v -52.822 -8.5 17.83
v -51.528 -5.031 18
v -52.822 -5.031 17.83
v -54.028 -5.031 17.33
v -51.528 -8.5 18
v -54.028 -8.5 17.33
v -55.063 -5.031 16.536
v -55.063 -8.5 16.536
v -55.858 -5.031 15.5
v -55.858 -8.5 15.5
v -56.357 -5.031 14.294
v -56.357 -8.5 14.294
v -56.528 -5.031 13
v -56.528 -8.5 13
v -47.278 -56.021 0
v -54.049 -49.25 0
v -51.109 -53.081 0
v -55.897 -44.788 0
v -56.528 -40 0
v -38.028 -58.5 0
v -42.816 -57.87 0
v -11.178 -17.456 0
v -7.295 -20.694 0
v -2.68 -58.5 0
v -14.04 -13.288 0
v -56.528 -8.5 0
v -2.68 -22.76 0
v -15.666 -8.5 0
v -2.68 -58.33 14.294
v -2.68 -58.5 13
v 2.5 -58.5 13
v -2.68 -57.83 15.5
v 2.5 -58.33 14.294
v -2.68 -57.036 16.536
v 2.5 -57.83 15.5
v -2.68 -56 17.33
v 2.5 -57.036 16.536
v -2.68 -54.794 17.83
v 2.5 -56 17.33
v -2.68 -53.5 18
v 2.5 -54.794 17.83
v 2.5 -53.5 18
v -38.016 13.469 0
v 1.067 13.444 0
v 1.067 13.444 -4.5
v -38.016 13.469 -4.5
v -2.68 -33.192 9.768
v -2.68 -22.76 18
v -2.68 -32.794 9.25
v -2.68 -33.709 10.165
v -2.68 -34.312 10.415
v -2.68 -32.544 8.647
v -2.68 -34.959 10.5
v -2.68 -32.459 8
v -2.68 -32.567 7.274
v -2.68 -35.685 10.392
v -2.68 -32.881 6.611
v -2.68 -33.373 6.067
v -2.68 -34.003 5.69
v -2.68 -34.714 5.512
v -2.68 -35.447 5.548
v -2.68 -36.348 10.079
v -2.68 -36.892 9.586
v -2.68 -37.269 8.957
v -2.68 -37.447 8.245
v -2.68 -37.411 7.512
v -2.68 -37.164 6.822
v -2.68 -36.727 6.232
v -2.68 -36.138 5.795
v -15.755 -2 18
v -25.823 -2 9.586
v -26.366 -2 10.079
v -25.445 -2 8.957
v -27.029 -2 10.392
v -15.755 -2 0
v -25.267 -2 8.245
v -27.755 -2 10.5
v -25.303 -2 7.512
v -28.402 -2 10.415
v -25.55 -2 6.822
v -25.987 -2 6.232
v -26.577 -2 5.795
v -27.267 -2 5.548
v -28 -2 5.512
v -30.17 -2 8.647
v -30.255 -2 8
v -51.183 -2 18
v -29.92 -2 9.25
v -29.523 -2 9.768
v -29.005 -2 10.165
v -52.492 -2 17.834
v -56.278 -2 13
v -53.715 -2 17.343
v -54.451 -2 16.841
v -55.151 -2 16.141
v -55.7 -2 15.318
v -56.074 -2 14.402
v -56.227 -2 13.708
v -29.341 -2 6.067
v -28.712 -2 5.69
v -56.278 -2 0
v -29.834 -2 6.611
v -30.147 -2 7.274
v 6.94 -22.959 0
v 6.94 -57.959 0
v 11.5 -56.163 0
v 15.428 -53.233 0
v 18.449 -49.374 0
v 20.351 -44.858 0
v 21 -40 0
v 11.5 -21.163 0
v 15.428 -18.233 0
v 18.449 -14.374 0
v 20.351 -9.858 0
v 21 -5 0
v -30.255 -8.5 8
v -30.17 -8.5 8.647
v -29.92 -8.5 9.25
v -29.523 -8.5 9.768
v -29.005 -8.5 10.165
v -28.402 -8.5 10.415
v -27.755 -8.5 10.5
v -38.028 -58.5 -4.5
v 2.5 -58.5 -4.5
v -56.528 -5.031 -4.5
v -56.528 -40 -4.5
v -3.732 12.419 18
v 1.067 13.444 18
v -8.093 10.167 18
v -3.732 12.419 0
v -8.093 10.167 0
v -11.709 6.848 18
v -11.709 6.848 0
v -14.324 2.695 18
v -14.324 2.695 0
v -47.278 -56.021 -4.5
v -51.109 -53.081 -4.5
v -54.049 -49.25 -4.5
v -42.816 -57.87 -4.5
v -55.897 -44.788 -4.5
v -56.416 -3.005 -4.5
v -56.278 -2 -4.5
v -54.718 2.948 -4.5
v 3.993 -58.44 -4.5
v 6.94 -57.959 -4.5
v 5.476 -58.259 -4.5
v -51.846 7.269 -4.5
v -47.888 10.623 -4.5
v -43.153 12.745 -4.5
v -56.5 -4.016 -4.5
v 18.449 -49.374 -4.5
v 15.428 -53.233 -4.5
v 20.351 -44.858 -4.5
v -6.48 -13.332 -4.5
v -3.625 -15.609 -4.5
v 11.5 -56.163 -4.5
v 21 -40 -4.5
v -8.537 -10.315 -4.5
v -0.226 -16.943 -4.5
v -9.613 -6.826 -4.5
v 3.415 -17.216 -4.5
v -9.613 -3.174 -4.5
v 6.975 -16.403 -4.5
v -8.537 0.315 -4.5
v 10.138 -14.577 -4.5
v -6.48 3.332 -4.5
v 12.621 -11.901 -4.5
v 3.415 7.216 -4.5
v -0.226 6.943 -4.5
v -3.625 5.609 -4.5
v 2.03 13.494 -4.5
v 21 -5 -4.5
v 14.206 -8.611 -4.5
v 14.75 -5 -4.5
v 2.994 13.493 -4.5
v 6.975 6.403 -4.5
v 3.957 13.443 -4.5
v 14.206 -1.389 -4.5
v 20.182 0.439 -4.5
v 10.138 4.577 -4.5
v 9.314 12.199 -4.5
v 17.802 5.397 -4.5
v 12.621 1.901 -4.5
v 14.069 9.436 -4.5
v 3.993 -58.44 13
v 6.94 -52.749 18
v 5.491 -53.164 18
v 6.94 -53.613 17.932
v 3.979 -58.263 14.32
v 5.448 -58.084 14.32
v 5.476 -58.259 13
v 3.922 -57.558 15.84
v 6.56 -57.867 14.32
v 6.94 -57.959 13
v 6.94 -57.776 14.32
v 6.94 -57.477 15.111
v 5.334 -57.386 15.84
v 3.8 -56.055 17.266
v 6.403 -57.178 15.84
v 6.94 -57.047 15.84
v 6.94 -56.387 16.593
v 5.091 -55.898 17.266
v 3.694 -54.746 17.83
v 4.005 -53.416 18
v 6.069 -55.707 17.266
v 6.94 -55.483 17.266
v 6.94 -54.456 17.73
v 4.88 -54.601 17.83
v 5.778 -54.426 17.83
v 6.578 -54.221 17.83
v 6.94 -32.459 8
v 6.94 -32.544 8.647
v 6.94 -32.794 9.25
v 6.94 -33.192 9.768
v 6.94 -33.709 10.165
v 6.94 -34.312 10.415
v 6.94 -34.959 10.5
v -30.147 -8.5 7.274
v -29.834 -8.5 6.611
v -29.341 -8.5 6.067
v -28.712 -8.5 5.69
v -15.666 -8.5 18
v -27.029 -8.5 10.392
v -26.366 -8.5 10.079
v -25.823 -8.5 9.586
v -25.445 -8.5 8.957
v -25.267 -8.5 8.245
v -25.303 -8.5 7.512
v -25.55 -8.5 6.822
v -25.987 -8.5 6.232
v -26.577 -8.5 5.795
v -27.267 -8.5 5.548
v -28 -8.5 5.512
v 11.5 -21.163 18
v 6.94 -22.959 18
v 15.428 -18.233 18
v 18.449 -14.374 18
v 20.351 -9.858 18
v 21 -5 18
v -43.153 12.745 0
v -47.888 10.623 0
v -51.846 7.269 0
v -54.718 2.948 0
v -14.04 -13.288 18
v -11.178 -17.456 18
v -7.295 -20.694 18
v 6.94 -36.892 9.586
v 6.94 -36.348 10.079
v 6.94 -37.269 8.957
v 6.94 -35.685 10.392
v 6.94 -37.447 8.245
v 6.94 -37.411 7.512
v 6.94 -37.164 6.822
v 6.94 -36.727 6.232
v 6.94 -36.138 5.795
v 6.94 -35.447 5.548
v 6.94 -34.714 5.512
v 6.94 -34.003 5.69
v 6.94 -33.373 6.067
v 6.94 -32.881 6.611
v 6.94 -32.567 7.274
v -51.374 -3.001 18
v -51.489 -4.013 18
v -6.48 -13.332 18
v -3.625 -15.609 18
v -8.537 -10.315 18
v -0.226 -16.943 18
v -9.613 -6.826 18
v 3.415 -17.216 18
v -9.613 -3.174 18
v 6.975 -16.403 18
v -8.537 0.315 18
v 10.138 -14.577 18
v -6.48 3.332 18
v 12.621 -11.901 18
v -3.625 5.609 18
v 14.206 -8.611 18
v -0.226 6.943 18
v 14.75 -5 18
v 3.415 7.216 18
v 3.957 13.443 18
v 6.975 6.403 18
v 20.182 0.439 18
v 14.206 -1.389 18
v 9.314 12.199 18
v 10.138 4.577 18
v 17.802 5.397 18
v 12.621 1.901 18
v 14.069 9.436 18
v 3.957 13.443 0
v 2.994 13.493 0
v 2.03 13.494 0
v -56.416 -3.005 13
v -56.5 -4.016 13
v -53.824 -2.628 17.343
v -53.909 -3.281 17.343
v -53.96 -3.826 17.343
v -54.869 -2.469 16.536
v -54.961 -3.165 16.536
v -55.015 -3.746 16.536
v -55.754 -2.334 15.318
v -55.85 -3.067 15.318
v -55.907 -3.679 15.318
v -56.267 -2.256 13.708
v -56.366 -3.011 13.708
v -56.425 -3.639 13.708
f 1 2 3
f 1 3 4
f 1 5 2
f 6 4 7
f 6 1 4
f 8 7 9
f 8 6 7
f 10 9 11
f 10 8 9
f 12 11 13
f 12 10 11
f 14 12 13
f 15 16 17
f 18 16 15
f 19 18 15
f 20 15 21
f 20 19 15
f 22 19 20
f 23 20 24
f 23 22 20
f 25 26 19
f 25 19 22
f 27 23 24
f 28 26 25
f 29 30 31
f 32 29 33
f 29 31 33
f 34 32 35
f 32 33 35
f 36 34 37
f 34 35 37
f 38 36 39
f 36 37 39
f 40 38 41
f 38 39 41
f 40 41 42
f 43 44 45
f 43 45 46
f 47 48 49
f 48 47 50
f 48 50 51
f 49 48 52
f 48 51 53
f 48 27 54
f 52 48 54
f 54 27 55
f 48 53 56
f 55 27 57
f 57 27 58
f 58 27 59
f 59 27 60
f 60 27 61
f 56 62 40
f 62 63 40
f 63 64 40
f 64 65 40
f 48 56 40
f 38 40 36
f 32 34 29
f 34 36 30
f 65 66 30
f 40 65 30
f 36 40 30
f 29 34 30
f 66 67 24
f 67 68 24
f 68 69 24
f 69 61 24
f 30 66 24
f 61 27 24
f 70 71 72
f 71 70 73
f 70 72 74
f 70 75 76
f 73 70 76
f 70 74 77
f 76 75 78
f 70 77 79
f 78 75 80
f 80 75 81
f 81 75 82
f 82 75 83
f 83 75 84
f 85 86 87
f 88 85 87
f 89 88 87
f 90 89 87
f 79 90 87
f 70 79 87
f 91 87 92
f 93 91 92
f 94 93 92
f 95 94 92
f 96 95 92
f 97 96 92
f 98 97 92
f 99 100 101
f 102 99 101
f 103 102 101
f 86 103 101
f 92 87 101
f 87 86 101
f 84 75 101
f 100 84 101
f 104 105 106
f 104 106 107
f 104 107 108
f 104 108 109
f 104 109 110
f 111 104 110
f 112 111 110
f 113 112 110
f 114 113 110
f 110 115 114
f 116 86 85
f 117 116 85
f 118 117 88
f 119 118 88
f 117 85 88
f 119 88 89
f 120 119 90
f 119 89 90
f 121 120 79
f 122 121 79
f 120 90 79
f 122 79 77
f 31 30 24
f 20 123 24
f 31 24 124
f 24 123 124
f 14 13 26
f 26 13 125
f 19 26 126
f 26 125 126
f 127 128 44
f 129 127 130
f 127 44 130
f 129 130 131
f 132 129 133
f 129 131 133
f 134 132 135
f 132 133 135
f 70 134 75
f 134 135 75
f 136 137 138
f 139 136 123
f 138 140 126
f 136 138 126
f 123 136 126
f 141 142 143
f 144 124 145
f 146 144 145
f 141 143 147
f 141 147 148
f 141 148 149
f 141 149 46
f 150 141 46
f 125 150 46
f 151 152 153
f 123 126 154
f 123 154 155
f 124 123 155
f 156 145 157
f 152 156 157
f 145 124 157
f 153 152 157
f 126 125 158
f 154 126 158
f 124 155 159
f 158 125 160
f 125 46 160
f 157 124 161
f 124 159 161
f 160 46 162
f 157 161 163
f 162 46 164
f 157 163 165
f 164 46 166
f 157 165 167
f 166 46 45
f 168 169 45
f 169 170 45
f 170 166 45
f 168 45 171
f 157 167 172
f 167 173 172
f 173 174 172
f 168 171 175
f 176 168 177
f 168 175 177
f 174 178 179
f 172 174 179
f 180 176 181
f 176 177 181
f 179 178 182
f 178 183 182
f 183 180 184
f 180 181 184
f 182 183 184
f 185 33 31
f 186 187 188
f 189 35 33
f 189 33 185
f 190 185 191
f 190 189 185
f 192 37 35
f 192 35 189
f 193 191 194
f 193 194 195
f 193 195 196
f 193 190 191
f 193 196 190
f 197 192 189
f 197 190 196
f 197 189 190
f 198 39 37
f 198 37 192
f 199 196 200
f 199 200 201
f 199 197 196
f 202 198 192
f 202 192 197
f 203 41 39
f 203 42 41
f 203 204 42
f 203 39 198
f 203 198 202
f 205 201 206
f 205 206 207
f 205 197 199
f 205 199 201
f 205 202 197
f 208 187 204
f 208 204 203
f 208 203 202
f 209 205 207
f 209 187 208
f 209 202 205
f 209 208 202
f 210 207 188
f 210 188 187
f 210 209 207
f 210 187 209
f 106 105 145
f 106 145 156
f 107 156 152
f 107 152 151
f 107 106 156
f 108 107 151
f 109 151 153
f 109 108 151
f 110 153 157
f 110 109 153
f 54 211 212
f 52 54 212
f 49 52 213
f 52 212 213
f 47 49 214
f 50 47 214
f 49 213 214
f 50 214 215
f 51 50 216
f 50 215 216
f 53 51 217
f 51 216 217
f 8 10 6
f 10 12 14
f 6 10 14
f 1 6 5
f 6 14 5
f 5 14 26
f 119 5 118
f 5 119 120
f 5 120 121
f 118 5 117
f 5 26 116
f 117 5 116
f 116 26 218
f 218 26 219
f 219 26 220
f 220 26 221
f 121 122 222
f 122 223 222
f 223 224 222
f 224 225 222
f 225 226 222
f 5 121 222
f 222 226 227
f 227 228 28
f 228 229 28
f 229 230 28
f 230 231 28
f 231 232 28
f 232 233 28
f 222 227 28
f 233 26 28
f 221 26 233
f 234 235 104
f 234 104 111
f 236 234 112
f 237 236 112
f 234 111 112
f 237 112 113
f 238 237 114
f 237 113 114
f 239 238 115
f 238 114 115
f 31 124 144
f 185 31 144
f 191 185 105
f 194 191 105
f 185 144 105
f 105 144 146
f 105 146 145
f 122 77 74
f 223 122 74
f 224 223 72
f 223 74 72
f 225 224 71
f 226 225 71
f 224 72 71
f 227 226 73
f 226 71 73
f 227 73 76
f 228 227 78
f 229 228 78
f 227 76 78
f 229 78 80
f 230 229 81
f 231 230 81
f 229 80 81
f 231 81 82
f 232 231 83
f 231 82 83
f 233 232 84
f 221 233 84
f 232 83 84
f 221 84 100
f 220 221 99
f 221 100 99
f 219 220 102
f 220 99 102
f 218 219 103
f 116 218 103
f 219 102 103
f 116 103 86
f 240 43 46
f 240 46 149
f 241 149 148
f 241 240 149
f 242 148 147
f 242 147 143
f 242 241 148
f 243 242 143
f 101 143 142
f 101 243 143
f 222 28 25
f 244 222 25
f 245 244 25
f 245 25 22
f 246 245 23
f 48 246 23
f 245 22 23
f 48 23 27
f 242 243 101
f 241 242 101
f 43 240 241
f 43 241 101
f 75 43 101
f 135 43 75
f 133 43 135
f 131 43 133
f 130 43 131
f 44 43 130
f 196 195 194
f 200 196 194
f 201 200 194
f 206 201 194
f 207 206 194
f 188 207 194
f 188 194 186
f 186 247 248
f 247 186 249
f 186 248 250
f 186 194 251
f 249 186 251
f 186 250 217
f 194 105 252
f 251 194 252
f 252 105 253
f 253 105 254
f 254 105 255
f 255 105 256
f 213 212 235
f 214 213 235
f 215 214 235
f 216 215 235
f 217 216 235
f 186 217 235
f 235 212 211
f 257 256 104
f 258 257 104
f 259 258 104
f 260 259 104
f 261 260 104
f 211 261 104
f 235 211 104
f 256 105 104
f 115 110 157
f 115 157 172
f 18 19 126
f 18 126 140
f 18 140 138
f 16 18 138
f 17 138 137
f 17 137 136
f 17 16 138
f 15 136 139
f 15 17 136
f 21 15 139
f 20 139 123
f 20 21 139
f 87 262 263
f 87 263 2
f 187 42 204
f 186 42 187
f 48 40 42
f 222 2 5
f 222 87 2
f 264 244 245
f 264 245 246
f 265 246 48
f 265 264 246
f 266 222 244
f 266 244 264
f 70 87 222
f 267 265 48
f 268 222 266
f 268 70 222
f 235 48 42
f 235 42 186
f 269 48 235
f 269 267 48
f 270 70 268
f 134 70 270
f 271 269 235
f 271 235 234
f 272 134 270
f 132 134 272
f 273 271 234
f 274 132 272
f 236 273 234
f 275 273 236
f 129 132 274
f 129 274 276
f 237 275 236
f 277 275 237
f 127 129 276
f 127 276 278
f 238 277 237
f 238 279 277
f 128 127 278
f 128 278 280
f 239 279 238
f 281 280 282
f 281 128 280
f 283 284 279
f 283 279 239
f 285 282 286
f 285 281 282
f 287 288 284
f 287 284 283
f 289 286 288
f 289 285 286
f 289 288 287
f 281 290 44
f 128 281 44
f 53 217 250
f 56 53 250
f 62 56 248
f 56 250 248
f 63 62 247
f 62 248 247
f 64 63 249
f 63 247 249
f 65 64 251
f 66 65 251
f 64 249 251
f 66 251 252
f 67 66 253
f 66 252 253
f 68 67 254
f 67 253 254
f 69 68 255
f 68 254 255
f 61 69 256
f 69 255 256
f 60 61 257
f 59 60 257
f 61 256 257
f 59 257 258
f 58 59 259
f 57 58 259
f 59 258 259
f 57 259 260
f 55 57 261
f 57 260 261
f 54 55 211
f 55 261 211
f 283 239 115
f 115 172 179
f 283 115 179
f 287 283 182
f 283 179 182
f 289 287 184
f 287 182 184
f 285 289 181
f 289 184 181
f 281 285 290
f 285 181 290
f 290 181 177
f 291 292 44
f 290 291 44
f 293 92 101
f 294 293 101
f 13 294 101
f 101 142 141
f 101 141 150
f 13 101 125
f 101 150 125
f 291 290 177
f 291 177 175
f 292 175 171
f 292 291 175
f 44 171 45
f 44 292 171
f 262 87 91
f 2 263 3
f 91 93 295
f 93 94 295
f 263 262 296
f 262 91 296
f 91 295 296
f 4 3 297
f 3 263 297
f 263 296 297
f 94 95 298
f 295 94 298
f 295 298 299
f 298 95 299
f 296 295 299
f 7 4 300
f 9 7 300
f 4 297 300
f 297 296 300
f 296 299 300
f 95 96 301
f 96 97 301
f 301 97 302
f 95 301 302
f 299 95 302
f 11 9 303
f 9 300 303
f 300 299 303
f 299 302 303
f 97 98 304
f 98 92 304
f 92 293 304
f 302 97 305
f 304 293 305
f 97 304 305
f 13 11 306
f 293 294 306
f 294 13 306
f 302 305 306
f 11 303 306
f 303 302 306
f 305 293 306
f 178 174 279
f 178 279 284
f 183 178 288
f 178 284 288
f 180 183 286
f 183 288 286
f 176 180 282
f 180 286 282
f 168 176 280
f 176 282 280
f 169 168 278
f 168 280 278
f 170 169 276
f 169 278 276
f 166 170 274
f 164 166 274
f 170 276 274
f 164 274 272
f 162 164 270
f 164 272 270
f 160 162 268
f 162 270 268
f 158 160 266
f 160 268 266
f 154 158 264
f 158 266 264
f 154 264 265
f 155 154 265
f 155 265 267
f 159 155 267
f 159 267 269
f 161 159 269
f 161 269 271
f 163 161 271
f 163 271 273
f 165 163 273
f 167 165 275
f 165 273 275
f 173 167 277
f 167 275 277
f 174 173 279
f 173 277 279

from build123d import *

# Parameters (mm, degrees)
F0_R     = 13.35
F1_DEPTH = 4.5
F2_DEPTH = 18
F5_DEPTH = 63.468562
F6_DEPTH = 56.501
F7_R     = 5
F8_R     = 13.35
F8_R_2   = 12.25
F9_DEPTH = 22.5


with BuildPart() as f1:
    # F0 (on Top) → F1 (new body)
    with BuildSketch(Plane.XY):
        with BuildLine():
            ThreePointArc((6.94, -57.959298), (17.066915, -51.404166), (21, -40))
            Line((21, -40), (21, -5))
            ThreePointArc((21, -5), (17.066915, -16.404166), (6.94, -22.959298))
            Line((6.94, -22.959298), (6.94, -57.959298))
        make_face()
        with Locations((2.5, -5)):
            Circle(F0_R)
        with BuildLine():
            ThreePointArc((6.94, -22.959298), (17.066915, -16.404166), (21, -5))
            ThreePointArc((21, -5), (16.086734, 7.555902), (3.956684, 13.442561))
            Line((3.956684, 13.442561), (1.066985, 13.444416))
            ThreePointArc((1.066985, 13.444416), (-10.011528, 8.627607), (-15.755136, -2))
            ThreePointArc((-15.755136, -2), (-15.998257, -5.25395), (-15.665902, -8.5))
            ThreePointArc((-15.665902, -8.5), (-11.178256, -17.456136), (-2.68, -22.76))
            ThreePointArc((-2.68, -22.76), (2.116816, -23.496031), (6.94, -22.959298))
        make_face()
        with Locations((2.5, -5)):
            Circle(F0_R, mode=Mode.SUBTRACT)
        with BuildLine():
            ThreePointArc((2.5, -58.5), (4.736401, -58.364327), (6.94, -57.959298))
            Line((6.94, -57.959298), (6.94, -22.959298))
            ThreePointArc((6.94, -22.959298), (2.116816, -23.496031), (-2.68, -22.76))
            Line((-2.68, -22.76), (-2.68, -58.5))
            Line((-2.68, -58.5), (2.5, -58.5))
        make_face()
        with BuildLine():
            Line((1.066985, 13.444416), (3.956684, 13.442561))
            ThreePointArc((3.956684, 13.442561), (2.511871, 13.499996), (1.066985, 13.444416))
        make_face()
        with BuildLine():
            ThreePointArc((-15.755136, -2), (-10.011528, 8.627607), (1.066985, 13.444416))
            Line((1.066985, 13.444416), (-38.015691, 13.469493))
            ThreePointArc((-38.015691, 13.469493), (-49.985176, 9.085639), (-56.277659, -2))
            Line((-56.277659, -2), (-15.755136, -2))
        make_face()
        with BuildLine():
            Line((-2.68, -58.5), (-2.68, -22.76))
            ThreePointArc((-2.68, -22.76), (-11.178256, -17.456136), (-15.665902, -8.5))
            Line((-15.665902, -8.5), (-56.527562, -8.5))
            Line((-56.527562, -8.5), (-56.527562, -40))
            ThreePointArc((-56.527562, -40), (-51.109037, -53.081475), (-38.027562, -58.5))
            Line((-38.027562, -58.5), (-2.68, -58.5))
        make_face()
        with BuildLine():
            ThreePointArc((-15.665902, -8.5), (-15.998257, -5.25395), (-15.755136, -2))
            Line((-15.755136, -2), (-56.277659, -2))
            ThreePointArc((-56.277659, -2), (-56.46498, -3.510108), (-56.527562, -5.030503))
            Line((-56.527562, -5.030503), (-56.527562, -8.5))
            Line((-56.527562, -8.5), (-15.665902, -8.5))
        make_face()
    extrude(amount=-F1_DEPTH)

    # F0 (on Top) → F2 (join)
    with BuildSketch(Plane.XY):
        with BuildLine():
            ThreePointArc((2.5, -58.5), (4.736401, -58.364327), (6.94, -57.959298))
            Line((6.94, -57.959298), (6.94, -22.959298))
            ThreePointArc((6.94, -22.959298), (2.116816, -23.496031), (-2.68, -22.76))
            Line((-2.68, -22.76), (-2.68, -58.5))
            Line((-2.68, -58.5), (2.5, -58.5))
        make_face()
        with BuildLine():
            ThreePointArc((6.94, -22.959298), (17.066915, -16.404166), (21, -5))
            ThreePointArc((21, -5), (16.086734, 7.555902), (3.956684, 13.442561))
            Line((3.956684, 13.442561), (1.066985, 13.444416))
            ThreePointArc((1.066985, 13.444416), (-10.011528, 8.627607), (-15.755136, -2))
            ThreePointArc((-15.755136, -2), (-15.998257, -5.25395), (-15.665902, -8.5))
            ThreePointArc((-15.665902, -8.5), (-11.178256, -17.456136), (-2.68, -22.76))
            ThreePointArc((-2.68, -22.76), (2.116816, -23.496031), (6.94, -22.959298))
        make_face()
        with Locations((2.5, -5)):
            Circle(F0_R, mode=Mode.SUBTRACT)
        with BuildLine():
            ThreePointArc((-15.665902, -8.5), (-15.998257, -5.25395), (-15.755136, -2))
            Line((-15.755136, -2), (-56.277659, -2))
            ThreePointArc((-56.277659, -2), (-56.46498, -3.510108), (-56.527562, -5.030503))
            Line((-56.527562, -5.030503), (-56.527562, -8.5))
            Line((-56.527562, -8.5), (-15.665902, -8.5))
        make_face()
    extrude(amount=F2_DEPTH)

    # F3 (on face) → F5 (cut, through all)
    with BuildSketch(Plane.YZ.offset(6.94)):
        with BuildLine():
            ThreePointArc((-32.459298, 8), (-33.191531, 9.767767), (-34.959298, 10.5))
            ThreePointArc((-34.959298, 10.5), (-36.727065, 6.232233), (-32.459298, 8))
        make_face()
    extrude(amount=-F5_DEPTH, mode=Mode.SUBTRACT)

    # F4 (on face) → F6 (cut, through all)
    with BuildSketch(Plane(origin=(0, -2, 0), x_dir=(-1, 0, 0), z_dir=(0, 1, 0))):
        with BuildLine():
            ThreePointArc((30.255136, 8), (29.522903, 9.767767), (27.755136, 10.5))
            ThreePointArc((27.755136, 10.5), (25.987369, 6.232233), (30.255136, 8))
        make_face()
    extrude(amount=-F6_DEPTH, mode=Mode.SUBTRACT)

    # F7
    f7_edges = [f1.edges().sort_by_distance(p)[0] for p in [
        (-56.527562, -6.765252, 18),
        (-0.09, -58.5, 18),
        (4.736401, -58.364327, 18),
    ]]
    fillet(f7_edges, radius=F7_R)

    # F8 (on face) → F9 (join, through all)
    with BuildSketch(Plane.XY.offset(18)):
        with Locations((2.5, -5)):
            Circle(F8_R)
        with Locations((2.5, -5)):
            Circle(F8_R_2, mode=Mode.SUBTRACT)
    extrude(amount=-F9_DEPTH)


solid = f1.part
